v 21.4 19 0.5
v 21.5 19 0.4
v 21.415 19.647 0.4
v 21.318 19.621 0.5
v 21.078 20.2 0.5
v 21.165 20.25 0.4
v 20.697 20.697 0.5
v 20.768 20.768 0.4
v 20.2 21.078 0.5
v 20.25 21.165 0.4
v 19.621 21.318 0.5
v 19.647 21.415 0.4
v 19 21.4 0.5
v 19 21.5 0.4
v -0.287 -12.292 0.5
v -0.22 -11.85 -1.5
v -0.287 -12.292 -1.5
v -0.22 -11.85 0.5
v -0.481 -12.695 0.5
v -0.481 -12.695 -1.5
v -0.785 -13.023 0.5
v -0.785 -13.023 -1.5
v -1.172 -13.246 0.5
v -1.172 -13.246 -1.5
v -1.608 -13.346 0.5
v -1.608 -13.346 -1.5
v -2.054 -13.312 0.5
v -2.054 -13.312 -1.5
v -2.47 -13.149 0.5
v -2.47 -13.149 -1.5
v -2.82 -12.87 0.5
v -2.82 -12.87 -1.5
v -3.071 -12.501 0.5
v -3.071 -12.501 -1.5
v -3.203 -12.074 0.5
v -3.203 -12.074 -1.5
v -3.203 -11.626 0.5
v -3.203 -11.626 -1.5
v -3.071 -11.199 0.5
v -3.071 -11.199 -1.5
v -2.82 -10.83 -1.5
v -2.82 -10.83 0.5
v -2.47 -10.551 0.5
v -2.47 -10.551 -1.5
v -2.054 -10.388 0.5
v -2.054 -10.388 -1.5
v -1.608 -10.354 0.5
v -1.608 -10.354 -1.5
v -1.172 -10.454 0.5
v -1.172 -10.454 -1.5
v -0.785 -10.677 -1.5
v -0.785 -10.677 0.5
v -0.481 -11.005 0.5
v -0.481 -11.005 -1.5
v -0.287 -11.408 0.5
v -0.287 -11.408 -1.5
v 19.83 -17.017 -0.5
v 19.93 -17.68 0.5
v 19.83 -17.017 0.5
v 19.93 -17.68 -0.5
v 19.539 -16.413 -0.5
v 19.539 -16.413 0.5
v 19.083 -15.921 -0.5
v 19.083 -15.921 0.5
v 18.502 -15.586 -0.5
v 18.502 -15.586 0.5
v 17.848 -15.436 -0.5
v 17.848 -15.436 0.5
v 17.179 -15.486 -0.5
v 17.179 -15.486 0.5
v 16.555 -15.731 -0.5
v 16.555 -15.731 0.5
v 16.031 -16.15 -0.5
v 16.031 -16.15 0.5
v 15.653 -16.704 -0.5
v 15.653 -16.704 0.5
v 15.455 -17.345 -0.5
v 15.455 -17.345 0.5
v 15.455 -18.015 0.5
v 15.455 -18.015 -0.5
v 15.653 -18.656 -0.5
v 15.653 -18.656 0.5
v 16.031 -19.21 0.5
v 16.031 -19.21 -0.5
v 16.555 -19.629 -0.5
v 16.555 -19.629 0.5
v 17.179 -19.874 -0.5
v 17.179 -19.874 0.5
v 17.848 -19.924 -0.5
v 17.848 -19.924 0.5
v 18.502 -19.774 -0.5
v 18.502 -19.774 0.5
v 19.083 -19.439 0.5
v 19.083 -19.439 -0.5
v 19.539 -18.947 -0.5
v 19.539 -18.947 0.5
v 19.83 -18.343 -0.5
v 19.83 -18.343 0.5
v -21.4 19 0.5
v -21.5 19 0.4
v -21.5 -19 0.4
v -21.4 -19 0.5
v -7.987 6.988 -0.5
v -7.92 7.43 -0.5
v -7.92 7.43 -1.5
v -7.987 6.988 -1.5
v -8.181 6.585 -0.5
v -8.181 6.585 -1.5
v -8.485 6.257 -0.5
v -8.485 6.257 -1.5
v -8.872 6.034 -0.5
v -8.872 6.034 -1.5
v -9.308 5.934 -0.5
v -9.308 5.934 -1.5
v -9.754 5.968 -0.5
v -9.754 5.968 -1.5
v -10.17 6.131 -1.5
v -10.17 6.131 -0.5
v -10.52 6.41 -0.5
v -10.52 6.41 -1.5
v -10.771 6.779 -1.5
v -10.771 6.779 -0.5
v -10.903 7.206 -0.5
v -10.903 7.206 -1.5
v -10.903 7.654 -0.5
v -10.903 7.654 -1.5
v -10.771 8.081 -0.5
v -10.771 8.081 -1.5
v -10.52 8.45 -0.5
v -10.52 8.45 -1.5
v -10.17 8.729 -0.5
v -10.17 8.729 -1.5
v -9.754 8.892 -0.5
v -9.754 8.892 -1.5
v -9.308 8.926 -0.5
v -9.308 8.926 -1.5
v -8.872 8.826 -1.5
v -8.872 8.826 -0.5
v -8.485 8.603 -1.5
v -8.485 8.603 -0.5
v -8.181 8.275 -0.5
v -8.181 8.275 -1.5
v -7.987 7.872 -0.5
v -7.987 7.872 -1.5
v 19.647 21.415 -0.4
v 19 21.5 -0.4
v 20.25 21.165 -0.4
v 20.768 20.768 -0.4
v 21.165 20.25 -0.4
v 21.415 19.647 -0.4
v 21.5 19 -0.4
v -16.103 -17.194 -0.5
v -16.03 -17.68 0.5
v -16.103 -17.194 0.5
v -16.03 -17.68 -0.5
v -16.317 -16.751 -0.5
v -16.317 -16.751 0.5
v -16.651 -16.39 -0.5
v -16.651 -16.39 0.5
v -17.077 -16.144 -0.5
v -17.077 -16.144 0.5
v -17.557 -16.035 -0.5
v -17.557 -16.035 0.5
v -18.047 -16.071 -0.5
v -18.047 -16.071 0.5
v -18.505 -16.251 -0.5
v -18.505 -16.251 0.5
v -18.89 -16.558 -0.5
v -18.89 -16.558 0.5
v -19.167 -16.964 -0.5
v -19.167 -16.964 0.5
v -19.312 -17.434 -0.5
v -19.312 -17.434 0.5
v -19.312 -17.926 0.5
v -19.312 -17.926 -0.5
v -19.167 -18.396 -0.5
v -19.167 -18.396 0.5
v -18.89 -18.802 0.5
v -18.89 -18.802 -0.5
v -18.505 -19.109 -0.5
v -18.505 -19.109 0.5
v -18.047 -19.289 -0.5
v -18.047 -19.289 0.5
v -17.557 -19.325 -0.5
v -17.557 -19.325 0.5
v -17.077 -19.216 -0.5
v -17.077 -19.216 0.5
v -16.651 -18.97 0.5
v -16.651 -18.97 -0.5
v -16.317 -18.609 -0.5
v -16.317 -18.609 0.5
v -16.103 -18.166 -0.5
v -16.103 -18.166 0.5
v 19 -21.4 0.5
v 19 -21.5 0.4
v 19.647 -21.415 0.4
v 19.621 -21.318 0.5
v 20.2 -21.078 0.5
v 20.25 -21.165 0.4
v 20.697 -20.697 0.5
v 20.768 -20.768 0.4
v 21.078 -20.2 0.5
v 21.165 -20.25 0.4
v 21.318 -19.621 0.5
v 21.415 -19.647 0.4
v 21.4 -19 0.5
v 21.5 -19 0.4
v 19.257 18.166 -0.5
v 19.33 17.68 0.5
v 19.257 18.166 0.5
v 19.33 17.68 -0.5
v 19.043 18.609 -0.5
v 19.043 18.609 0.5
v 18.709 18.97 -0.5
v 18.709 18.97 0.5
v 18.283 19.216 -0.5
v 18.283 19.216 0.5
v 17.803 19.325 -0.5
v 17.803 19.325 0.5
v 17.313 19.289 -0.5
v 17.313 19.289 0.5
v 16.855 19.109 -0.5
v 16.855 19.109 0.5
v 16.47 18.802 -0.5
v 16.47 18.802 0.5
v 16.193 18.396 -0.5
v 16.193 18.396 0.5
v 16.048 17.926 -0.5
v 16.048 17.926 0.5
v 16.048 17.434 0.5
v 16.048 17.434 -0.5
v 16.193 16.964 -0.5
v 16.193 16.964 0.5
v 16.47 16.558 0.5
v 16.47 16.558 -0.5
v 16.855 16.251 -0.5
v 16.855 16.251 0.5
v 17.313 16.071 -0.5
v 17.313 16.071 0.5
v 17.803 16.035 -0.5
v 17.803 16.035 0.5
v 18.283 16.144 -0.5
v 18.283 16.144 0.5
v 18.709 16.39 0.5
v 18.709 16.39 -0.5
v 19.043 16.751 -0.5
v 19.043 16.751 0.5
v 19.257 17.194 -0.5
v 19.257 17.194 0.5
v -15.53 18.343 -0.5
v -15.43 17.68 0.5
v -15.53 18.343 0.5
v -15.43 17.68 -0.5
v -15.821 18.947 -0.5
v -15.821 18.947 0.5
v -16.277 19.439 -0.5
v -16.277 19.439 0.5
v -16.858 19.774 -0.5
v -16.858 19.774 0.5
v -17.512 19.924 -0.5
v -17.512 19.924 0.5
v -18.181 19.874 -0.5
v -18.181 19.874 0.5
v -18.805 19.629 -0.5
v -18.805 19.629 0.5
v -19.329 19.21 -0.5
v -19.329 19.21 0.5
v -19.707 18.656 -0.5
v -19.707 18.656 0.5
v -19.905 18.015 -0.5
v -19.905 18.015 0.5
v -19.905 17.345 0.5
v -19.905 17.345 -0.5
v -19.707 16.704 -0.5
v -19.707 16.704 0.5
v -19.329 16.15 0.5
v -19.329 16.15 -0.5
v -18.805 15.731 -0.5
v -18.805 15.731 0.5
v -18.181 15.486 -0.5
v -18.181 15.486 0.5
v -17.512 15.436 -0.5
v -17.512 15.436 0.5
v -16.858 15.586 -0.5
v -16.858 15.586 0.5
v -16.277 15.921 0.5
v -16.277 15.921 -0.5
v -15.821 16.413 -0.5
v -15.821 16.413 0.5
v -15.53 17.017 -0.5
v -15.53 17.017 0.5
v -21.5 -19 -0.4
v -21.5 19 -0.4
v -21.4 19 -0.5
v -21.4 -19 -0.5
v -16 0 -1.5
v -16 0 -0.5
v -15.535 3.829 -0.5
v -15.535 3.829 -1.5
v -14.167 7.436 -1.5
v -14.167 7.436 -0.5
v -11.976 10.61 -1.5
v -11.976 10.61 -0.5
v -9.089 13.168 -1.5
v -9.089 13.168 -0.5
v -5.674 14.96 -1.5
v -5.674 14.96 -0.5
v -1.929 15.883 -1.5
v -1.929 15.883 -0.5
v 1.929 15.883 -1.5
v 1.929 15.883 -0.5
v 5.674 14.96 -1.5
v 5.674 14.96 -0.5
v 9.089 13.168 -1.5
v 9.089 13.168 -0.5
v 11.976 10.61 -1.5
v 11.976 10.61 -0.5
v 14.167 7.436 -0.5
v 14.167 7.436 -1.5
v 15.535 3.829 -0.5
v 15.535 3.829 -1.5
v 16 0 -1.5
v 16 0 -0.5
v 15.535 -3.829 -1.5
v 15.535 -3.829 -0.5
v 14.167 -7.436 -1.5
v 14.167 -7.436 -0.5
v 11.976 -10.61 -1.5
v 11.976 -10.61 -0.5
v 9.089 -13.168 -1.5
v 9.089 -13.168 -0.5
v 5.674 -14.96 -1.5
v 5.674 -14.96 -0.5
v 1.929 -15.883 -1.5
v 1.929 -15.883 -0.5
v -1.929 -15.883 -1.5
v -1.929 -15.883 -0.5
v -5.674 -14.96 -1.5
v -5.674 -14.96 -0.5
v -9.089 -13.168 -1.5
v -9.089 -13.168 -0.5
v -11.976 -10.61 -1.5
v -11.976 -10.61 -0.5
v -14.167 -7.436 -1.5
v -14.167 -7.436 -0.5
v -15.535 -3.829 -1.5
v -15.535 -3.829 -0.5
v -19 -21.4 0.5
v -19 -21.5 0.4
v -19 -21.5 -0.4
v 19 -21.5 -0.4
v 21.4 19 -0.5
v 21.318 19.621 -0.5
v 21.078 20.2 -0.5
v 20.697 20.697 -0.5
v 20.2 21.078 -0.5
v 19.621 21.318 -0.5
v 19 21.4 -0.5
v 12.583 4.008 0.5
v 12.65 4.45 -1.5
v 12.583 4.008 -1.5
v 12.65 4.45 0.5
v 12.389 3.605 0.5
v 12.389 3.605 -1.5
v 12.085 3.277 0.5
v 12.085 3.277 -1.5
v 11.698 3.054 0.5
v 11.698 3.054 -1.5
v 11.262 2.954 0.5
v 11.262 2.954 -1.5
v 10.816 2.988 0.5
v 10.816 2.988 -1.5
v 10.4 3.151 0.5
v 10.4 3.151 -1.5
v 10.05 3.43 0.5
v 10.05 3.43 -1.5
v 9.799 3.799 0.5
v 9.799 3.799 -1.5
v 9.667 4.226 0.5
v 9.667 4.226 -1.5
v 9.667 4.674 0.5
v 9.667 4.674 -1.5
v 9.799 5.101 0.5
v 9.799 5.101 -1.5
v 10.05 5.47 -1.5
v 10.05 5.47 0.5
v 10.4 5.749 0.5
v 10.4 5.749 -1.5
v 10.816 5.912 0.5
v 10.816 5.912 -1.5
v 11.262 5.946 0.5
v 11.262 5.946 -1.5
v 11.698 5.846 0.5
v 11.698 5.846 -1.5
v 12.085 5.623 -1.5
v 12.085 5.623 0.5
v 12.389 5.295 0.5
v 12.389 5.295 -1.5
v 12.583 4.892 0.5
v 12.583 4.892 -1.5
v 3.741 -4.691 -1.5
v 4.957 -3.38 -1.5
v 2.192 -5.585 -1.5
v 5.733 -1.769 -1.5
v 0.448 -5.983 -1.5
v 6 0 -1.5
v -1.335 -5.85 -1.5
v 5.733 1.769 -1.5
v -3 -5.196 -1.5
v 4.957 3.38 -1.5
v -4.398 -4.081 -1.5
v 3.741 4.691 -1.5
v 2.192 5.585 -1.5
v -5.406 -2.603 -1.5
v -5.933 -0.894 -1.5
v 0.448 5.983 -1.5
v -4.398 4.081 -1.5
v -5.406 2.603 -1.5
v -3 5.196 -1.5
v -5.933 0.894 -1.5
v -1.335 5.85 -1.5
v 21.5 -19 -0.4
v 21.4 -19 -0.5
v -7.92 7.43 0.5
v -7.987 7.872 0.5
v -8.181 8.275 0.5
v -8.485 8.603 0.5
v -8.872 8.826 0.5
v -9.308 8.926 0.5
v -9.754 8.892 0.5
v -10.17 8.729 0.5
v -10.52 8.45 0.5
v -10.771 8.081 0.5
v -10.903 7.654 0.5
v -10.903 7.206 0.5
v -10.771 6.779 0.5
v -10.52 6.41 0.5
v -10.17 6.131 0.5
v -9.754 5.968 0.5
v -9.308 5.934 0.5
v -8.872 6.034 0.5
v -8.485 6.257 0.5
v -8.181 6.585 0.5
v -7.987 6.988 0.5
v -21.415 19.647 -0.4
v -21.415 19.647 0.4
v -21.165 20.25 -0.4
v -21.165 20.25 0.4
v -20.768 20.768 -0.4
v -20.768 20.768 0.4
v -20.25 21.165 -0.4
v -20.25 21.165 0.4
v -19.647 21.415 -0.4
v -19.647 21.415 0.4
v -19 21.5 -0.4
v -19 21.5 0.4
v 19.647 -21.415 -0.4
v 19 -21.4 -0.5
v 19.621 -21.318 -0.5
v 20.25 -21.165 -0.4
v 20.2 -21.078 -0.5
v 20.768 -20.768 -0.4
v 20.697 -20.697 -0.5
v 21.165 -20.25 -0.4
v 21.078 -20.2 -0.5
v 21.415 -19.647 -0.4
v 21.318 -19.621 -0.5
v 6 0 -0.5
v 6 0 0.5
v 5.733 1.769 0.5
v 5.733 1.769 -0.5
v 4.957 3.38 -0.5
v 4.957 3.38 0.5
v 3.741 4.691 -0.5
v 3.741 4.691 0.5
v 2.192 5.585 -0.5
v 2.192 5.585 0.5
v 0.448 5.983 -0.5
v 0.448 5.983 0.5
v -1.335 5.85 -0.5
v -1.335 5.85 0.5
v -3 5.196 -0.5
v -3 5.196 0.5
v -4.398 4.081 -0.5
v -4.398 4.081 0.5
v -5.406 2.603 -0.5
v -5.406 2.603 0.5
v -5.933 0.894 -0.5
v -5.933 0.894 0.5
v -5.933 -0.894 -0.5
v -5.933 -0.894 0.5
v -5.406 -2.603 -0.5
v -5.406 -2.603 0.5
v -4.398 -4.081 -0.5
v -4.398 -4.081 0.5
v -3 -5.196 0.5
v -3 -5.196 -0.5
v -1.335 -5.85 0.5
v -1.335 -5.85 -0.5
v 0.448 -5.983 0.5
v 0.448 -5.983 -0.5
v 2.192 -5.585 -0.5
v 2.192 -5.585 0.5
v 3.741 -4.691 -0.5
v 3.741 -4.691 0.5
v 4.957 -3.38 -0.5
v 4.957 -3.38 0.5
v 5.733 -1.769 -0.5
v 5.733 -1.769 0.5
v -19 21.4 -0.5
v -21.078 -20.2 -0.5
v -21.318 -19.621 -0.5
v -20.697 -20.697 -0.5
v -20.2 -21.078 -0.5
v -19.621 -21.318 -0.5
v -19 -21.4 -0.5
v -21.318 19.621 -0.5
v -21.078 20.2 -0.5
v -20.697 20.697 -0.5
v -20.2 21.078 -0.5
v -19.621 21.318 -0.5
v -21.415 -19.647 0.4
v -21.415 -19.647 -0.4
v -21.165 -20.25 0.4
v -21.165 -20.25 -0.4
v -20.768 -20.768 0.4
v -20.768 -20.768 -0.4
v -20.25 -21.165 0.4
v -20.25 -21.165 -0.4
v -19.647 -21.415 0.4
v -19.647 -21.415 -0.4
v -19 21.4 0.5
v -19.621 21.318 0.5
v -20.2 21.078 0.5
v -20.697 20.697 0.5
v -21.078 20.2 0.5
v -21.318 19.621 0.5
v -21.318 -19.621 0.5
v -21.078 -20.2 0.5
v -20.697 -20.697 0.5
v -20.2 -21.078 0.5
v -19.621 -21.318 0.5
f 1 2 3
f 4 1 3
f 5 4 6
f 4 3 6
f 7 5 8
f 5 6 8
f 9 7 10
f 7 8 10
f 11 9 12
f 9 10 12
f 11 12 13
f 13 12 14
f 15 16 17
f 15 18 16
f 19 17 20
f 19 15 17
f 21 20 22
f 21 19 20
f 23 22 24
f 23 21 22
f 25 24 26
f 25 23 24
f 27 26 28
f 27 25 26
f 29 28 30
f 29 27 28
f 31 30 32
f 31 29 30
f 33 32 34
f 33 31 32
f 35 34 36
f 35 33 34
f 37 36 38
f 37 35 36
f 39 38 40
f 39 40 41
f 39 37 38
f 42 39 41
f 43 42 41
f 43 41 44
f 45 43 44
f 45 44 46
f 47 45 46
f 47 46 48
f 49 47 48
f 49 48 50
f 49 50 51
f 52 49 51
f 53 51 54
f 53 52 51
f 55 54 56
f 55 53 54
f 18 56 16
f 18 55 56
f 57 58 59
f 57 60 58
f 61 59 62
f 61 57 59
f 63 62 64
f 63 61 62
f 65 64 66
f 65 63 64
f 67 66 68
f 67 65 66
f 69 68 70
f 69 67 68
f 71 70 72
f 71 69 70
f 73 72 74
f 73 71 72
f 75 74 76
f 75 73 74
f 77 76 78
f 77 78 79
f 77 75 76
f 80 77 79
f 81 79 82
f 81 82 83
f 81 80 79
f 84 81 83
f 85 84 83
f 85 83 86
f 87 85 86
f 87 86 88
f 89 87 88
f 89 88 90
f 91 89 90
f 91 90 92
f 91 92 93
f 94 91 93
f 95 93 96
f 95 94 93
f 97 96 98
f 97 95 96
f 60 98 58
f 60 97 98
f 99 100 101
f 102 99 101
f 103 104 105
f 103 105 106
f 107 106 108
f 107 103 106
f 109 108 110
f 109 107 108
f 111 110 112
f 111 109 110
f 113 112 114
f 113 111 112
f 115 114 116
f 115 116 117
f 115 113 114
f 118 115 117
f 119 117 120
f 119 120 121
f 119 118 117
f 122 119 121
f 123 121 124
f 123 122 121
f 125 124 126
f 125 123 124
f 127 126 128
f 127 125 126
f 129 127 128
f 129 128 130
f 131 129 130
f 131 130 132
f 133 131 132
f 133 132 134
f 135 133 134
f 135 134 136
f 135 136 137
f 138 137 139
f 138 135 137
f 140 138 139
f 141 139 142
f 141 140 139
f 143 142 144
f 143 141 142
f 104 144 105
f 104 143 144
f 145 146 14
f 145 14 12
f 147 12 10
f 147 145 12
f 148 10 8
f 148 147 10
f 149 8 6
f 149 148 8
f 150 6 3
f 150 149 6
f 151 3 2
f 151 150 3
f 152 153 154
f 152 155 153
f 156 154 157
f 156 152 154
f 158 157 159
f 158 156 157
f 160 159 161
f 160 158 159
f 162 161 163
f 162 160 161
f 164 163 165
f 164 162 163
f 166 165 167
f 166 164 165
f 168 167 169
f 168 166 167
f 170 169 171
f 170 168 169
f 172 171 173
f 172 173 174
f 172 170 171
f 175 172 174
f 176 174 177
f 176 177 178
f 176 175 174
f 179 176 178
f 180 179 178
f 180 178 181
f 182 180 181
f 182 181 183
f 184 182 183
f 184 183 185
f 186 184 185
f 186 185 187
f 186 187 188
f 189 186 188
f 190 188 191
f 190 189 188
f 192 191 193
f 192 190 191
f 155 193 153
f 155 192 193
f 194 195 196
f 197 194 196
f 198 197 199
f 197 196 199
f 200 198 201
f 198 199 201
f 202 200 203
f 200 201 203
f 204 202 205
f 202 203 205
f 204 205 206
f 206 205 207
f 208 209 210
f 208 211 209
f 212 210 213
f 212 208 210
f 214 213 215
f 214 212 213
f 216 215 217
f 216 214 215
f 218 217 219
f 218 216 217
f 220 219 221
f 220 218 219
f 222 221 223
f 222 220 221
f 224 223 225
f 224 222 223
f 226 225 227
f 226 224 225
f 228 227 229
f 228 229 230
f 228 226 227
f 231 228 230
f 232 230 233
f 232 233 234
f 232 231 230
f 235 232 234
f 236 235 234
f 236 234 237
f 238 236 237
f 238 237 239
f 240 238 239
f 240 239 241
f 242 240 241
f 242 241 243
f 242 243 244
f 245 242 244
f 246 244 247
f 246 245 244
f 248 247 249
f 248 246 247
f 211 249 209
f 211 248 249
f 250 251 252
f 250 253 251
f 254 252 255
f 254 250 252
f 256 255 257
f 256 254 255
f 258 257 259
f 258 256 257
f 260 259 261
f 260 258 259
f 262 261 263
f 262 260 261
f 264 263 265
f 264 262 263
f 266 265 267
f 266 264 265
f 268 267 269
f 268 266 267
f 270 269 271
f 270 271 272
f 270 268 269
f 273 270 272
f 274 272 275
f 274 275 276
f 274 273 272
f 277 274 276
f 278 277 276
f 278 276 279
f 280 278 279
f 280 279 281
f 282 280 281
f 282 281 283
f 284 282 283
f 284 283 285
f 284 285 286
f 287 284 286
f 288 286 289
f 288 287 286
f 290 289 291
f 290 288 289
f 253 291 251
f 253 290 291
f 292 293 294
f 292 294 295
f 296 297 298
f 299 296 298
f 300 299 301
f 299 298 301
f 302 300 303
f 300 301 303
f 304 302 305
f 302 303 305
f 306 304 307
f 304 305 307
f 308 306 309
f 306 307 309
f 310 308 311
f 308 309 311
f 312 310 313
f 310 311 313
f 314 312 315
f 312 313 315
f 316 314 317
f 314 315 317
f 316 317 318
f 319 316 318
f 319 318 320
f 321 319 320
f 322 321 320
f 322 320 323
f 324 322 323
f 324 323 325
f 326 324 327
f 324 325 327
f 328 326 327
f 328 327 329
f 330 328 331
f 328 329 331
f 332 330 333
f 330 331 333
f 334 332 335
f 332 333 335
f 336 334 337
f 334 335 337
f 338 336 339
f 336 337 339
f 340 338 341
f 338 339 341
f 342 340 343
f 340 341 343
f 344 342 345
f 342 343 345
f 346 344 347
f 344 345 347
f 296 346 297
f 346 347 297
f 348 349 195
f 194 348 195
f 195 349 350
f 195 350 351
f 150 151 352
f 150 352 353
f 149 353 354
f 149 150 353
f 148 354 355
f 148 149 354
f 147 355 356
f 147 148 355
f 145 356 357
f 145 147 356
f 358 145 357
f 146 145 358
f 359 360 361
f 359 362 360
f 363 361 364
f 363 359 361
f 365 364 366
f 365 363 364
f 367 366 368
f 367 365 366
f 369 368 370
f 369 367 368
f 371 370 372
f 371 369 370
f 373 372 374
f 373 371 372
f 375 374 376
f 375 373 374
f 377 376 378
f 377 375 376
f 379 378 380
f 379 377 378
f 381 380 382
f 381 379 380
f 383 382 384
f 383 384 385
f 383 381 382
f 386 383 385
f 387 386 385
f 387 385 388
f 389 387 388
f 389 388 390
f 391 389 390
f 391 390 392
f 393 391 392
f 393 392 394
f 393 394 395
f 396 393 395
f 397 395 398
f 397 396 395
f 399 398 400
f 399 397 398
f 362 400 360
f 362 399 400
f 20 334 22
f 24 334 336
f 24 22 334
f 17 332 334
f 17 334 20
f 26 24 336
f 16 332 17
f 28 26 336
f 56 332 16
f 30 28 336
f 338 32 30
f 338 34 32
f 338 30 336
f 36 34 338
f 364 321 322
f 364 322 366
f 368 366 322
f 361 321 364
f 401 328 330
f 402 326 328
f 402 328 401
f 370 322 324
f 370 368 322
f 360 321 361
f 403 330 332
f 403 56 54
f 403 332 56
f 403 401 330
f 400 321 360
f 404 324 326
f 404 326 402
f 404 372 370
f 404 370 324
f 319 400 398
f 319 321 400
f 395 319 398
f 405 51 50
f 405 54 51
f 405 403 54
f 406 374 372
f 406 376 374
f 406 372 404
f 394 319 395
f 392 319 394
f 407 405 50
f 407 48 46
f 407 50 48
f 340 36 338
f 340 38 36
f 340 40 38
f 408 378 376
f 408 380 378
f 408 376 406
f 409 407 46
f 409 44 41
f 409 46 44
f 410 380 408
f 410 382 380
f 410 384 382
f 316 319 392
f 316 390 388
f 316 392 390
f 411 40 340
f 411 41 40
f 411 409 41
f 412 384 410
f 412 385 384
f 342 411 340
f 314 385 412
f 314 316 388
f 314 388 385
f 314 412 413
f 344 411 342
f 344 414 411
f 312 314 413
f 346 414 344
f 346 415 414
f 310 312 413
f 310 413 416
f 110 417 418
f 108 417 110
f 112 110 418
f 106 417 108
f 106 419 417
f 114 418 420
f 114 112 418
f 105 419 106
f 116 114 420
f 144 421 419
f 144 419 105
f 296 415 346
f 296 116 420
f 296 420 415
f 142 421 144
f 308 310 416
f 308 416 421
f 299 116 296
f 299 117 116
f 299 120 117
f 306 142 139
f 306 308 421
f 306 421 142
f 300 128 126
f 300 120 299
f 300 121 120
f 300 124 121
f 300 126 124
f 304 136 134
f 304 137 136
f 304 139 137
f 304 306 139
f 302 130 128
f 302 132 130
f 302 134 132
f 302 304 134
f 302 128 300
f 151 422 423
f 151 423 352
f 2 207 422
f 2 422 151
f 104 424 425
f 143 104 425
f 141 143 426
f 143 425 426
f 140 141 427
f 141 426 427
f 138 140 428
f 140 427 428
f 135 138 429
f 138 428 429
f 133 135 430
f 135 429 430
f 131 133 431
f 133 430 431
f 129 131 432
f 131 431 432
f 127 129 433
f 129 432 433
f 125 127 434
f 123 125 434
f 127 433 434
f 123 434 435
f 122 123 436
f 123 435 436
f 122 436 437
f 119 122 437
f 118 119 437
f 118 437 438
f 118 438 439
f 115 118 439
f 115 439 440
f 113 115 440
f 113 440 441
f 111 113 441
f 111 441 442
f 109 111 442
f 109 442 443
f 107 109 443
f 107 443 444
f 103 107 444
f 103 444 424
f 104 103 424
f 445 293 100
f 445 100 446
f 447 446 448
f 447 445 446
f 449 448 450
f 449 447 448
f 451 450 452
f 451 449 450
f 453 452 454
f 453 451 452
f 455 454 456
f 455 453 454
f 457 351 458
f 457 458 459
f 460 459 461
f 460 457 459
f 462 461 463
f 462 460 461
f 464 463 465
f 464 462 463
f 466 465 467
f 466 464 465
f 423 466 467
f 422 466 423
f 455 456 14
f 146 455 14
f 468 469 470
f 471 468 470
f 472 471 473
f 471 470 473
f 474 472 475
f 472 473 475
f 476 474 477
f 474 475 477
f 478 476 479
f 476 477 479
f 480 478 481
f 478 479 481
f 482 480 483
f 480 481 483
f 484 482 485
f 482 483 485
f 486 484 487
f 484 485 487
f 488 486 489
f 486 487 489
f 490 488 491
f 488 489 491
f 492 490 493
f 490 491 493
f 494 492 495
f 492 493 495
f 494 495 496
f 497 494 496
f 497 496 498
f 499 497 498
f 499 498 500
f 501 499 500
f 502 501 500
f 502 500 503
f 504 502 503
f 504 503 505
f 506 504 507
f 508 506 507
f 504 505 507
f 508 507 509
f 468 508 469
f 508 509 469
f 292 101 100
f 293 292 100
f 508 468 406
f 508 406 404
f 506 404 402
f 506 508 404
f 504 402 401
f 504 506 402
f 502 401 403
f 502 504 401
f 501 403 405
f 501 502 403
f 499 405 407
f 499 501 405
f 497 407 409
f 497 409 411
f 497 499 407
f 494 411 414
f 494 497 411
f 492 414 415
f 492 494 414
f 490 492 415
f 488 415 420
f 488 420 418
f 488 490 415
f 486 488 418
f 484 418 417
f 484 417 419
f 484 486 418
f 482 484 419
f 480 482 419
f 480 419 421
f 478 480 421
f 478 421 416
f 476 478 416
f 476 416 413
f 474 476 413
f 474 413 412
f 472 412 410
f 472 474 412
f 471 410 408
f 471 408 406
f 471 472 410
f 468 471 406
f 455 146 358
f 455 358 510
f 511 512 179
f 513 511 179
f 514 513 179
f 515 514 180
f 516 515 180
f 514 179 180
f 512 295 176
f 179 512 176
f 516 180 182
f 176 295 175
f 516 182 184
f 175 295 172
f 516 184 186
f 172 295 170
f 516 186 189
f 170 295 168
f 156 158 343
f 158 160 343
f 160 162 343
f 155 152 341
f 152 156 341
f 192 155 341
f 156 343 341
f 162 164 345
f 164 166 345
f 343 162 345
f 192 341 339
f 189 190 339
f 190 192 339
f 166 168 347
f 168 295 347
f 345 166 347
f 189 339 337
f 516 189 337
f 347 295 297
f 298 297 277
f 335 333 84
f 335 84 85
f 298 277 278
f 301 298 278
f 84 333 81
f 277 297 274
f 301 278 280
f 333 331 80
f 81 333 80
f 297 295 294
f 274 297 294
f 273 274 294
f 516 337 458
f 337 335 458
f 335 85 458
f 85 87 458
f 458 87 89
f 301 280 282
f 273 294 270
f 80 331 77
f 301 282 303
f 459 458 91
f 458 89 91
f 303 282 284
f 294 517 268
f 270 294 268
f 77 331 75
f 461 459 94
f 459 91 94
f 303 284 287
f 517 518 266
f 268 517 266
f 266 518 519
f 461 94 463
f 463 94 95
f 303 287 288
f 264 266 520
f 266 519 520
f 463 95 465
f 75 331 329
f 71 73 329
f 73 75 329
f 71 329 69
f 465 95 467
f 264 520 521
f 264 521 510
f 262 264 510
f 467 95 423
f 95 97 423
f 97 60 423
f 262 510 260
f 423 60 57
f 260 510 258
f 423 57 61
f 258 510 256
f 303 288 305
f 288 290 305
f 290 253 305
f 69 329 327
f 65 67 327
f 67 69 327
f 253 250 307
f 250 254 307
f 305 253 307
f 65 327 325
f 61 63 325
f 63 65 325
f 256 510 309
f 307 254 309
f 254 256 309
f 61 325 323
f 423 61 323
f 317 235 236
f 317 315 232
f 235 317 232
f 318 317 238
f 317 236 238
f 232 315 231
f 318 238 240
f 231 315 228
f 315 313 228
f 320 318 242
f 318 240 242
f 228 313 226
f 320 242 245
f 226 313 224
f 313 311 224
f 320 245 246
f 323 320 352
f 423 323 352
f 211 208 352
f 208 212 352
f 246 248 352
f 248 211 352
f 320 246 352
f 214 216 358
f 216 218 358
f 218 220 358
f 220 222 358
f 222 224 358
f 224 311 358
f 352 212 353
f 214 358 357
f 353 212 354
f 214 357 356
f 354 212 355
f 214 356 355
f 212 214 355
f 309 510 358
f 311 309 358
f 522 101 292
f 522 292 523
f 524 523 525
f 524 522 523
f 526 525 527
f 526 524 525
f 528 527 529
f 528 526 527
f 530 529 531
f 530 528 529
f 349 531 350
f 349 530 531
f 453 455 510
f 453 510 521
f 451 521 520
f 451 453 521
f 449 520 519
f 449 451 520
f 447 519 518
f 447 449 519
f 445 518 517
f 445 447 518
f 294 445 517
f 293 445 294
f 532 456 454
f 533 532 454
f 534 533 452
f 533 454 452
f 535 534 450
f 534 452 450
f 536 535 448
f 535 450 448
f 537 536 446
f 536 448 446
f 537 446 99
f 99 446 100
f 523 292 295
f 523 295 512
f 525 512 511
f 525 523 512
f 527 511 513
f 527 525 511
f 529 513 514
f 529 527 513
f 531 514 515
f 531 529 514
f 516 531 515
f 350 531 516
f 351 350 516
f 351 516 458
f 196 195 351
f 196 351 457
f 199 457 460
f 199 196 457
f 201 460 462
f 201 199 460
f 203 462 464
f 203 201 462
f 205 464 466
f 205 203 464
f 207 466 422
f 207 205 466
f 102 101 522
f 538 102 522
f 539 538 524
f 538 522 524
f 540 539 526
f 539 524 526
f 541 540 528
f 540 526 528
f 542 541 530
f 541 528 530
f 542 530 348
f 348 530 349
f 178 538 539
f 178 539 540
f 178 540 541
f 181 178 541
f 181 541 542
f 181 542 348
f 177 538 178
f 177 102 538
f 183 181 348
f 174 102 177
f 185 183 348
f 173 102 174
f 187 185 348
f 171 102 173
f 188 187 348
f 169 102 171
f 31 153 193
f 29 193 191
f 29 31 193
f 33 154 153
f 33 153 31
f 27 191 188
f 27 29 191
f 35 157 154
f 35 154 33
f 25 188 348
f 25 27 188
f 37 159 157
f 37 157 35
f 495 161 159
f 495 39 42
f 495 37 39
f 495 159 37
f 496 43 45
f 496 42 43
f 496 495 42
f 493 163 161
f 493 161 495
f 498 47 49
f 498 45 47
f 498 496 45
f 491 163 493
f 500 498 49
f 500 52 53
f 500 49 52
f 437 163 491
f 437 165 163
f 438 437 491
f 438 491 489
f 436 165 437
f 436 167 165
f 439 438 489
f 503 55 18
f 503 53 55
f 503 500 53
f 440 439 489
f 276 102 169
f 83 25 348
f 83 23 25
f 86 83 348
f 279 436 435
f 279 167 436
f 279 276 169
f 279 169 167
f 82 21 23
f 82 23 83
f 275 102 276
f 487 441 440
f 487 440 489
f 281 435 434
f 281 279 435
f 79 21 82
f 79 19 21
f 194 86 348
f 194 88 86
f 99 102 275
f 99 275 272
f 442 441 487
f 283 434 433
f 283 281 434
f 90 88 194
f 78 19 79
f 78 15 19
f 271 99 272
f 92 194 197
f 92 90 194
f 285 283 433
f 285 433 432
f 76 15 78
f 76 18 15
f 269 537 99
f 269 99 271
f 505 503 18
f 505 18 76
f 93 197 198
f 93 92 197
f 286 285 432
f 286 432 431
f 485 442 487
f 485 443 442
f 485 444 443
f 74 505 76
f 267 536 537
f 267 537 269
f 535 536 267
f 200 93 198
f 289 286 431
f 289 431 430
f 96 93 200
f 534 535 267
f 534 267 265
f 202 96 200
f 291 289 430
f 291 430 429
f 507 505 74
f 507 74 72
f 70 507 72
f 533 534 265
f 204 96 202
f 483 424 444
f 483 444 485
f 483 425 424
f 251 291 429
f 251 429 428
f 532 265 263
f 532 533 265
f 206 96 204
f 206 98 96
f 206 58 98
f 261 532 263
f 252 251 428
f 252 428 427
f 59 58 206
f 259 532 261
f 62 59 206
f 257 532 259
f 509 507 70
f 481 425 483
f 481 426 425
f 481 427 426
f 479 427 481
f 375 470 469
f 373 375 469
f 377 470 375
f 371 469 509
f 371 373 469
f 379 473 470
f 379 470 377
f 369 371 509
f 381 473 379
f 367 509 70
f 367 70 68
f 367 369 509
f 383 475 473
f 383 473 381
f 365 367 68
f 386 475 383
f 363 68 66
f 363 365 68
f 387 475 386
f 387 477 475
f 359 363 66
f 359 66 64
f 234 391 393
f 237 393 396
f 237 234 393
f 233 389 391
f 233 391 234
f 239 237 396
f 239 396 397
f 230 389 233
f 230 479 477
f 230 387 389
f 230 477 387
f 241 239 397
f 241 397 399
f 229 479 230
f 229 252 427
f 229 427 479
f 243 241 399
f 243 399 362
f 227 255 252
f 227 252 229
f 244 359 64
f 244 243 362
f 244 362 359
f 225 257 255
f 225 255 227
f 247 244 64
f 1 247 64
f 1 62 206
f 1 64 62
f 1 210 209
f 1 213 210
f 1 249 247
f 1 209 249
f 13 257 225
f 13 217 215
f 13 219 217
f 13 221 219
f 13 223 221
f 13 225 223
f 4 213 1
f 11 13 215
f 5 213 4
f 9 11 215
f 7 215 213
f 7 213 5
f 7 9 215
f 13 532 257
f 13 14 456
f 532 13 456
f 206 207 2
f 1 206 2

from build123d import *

# Parameters (mm, degrees)
SKETCH1_W           = 43
SKETCH1_H           = 43
SKETCH1_R           = 2.25
SKETCH1_R_2         = 1.65
BOSS_EXTRUDE1_DEPTH = 0.5
SKETCH2_R           = 6
CUT_EXTRUDE1_DEPTH  = 1
FILLET1_R           = 2.5
CHAMFER1_SIZE       = 0.1
SKETCH3_R           = 1.5
CUT_EXTRUDE2_DEPTH  = 31.42203149
SKETCH4_R           = 16
SKETCH4_R_2         = 6
SKETCH4_R_3         = 1.5
BOSS_EXTRUDE2_DEPTH = 1


with BuildPart() as part:
    # Sketch1 → Boss-Extrude1 (new, symmetric)
    with BuildSketch(Plane.XY):
        Rectangle(SKETCH1_W, SKETCH1_H)
        with Locations((-17.68, 17.68)):
            Circle(SKETCH1_R, mode=Mode.SUBTRACT)
        with Locations((17.68, -17.68)):
            Circle(SKETCH1_R, mode=Mode.SUBTRACT)
        with Locations((17.68, 17.68)):
            Circle(SKETCH1_R_2, mode=Mode.SUBTRACT)
        with Locations((-17.68, -17.68)):
            Circle(SKETCH1_R_2, mode=Mode.SUBTRACT)
    extrude(amount=BOSS_EXTRUDE1_DEPTH, both=True)

    # Sketch2 → Cut-Extrude1 (cut)
    with BuildSketch(Plane.XY.offset(0.5)):
        Circle(SKETCH2_R)
    extrude(amount=-CUT_EXTRUDE1_DEPTH, mode=Mode.SUBTRACT)

    # Fillet1
    fillet1_edges = [part.edges().sort_by_distance(p)[0] for p in [
        (21.5, -21.5, 0),
        (-21.5, -21.5, 0),
        (-21.5, 21.5, 0),
        (21.5, 21.5, 0),
    ]]
    fillet(fillet1_edges, radius=FILLET1_R)

    # Chamfer1
    chamfer1_edges = [part.edges().sort_by_distance(p)[0] for p in [
        (0, -21.5, -0.5),
        (0, -21.5, 0.5),
        (21.5, 0, -0.5),
        (-21.5, 0, -0.5),
        (0, 21.5, -0.5),
        (-20.767766953, 20.767766953, -0.5),
        (20.767766953, 20.767766953, -0.5),
        (20.767766953, -20.767766953, -0.5),
        (-20.767766953, -20.767766953, -0.5),
        (-21.5, 0, 0.5),
        (21.5, 0, 0.5),
        (0, 21.5, 0.5),
        (-20.767766953, 20.767766953, 0.5),
        (20.767766953, 20.767766953, 0.5),
        (20.767766953, -20.767766953, 0.5),
        (-20.767766953, -20.767766953, 0.5),
    ]]
    chamfer(chamfer1_edges, length=CHAMFER1_SIZE)

    # Sketch3 → Cut-Extrude2 (cut, through all)
    with BuildSketch(Plane.XY.offset(0.5)):
        with Locations((-9.42, 7.43)):
            Circle(SKETCH3_R)
        with Locations((11.15, 4.45)):
            Circle(SKETCH3_R)
        with Locations((-1.72, -11.85)):
            Circle(SKETCH3_R)
    extrude(amount=-CUT_EXTRUDE2_DEPTH, mode=Mode.SUBTRACT)

    # Sketch4 → Boss-Extrude2 (add)
    with BuildSketch(Plane(origin=(0, 0, -0.5), x_dir=(-1, 0, 0), z_dir=(0, 0, -1))):
        Circle(SKETCH4_R)
        with Locations(Location((0, 0, 0), (0, 0, 180))):
            Circle(SKETCH4_R_2, mode=Mode.SUBTRACT)
        with Locations(Location((-11.15, 4.45, 0), (0, 0, 180))):
            Circle(SKETCH4_R_3, mode=Mode.SUBTRACT)
        with Locations(Location((9.42, 7.43, 0), (0, 0, 180))):
            Circle(SKETCH4_R_3, mode=Mode.SUBTRACT)
        with Locations(Location((1.72, -11.85, 0), (0, 0, 180))):
            Circle(SKETCH4_R_3, mode=Mode.SUBTRACT)
    extrude(amount=BOSS_EXTRUDE2_DEPTH)


solid = part.part
